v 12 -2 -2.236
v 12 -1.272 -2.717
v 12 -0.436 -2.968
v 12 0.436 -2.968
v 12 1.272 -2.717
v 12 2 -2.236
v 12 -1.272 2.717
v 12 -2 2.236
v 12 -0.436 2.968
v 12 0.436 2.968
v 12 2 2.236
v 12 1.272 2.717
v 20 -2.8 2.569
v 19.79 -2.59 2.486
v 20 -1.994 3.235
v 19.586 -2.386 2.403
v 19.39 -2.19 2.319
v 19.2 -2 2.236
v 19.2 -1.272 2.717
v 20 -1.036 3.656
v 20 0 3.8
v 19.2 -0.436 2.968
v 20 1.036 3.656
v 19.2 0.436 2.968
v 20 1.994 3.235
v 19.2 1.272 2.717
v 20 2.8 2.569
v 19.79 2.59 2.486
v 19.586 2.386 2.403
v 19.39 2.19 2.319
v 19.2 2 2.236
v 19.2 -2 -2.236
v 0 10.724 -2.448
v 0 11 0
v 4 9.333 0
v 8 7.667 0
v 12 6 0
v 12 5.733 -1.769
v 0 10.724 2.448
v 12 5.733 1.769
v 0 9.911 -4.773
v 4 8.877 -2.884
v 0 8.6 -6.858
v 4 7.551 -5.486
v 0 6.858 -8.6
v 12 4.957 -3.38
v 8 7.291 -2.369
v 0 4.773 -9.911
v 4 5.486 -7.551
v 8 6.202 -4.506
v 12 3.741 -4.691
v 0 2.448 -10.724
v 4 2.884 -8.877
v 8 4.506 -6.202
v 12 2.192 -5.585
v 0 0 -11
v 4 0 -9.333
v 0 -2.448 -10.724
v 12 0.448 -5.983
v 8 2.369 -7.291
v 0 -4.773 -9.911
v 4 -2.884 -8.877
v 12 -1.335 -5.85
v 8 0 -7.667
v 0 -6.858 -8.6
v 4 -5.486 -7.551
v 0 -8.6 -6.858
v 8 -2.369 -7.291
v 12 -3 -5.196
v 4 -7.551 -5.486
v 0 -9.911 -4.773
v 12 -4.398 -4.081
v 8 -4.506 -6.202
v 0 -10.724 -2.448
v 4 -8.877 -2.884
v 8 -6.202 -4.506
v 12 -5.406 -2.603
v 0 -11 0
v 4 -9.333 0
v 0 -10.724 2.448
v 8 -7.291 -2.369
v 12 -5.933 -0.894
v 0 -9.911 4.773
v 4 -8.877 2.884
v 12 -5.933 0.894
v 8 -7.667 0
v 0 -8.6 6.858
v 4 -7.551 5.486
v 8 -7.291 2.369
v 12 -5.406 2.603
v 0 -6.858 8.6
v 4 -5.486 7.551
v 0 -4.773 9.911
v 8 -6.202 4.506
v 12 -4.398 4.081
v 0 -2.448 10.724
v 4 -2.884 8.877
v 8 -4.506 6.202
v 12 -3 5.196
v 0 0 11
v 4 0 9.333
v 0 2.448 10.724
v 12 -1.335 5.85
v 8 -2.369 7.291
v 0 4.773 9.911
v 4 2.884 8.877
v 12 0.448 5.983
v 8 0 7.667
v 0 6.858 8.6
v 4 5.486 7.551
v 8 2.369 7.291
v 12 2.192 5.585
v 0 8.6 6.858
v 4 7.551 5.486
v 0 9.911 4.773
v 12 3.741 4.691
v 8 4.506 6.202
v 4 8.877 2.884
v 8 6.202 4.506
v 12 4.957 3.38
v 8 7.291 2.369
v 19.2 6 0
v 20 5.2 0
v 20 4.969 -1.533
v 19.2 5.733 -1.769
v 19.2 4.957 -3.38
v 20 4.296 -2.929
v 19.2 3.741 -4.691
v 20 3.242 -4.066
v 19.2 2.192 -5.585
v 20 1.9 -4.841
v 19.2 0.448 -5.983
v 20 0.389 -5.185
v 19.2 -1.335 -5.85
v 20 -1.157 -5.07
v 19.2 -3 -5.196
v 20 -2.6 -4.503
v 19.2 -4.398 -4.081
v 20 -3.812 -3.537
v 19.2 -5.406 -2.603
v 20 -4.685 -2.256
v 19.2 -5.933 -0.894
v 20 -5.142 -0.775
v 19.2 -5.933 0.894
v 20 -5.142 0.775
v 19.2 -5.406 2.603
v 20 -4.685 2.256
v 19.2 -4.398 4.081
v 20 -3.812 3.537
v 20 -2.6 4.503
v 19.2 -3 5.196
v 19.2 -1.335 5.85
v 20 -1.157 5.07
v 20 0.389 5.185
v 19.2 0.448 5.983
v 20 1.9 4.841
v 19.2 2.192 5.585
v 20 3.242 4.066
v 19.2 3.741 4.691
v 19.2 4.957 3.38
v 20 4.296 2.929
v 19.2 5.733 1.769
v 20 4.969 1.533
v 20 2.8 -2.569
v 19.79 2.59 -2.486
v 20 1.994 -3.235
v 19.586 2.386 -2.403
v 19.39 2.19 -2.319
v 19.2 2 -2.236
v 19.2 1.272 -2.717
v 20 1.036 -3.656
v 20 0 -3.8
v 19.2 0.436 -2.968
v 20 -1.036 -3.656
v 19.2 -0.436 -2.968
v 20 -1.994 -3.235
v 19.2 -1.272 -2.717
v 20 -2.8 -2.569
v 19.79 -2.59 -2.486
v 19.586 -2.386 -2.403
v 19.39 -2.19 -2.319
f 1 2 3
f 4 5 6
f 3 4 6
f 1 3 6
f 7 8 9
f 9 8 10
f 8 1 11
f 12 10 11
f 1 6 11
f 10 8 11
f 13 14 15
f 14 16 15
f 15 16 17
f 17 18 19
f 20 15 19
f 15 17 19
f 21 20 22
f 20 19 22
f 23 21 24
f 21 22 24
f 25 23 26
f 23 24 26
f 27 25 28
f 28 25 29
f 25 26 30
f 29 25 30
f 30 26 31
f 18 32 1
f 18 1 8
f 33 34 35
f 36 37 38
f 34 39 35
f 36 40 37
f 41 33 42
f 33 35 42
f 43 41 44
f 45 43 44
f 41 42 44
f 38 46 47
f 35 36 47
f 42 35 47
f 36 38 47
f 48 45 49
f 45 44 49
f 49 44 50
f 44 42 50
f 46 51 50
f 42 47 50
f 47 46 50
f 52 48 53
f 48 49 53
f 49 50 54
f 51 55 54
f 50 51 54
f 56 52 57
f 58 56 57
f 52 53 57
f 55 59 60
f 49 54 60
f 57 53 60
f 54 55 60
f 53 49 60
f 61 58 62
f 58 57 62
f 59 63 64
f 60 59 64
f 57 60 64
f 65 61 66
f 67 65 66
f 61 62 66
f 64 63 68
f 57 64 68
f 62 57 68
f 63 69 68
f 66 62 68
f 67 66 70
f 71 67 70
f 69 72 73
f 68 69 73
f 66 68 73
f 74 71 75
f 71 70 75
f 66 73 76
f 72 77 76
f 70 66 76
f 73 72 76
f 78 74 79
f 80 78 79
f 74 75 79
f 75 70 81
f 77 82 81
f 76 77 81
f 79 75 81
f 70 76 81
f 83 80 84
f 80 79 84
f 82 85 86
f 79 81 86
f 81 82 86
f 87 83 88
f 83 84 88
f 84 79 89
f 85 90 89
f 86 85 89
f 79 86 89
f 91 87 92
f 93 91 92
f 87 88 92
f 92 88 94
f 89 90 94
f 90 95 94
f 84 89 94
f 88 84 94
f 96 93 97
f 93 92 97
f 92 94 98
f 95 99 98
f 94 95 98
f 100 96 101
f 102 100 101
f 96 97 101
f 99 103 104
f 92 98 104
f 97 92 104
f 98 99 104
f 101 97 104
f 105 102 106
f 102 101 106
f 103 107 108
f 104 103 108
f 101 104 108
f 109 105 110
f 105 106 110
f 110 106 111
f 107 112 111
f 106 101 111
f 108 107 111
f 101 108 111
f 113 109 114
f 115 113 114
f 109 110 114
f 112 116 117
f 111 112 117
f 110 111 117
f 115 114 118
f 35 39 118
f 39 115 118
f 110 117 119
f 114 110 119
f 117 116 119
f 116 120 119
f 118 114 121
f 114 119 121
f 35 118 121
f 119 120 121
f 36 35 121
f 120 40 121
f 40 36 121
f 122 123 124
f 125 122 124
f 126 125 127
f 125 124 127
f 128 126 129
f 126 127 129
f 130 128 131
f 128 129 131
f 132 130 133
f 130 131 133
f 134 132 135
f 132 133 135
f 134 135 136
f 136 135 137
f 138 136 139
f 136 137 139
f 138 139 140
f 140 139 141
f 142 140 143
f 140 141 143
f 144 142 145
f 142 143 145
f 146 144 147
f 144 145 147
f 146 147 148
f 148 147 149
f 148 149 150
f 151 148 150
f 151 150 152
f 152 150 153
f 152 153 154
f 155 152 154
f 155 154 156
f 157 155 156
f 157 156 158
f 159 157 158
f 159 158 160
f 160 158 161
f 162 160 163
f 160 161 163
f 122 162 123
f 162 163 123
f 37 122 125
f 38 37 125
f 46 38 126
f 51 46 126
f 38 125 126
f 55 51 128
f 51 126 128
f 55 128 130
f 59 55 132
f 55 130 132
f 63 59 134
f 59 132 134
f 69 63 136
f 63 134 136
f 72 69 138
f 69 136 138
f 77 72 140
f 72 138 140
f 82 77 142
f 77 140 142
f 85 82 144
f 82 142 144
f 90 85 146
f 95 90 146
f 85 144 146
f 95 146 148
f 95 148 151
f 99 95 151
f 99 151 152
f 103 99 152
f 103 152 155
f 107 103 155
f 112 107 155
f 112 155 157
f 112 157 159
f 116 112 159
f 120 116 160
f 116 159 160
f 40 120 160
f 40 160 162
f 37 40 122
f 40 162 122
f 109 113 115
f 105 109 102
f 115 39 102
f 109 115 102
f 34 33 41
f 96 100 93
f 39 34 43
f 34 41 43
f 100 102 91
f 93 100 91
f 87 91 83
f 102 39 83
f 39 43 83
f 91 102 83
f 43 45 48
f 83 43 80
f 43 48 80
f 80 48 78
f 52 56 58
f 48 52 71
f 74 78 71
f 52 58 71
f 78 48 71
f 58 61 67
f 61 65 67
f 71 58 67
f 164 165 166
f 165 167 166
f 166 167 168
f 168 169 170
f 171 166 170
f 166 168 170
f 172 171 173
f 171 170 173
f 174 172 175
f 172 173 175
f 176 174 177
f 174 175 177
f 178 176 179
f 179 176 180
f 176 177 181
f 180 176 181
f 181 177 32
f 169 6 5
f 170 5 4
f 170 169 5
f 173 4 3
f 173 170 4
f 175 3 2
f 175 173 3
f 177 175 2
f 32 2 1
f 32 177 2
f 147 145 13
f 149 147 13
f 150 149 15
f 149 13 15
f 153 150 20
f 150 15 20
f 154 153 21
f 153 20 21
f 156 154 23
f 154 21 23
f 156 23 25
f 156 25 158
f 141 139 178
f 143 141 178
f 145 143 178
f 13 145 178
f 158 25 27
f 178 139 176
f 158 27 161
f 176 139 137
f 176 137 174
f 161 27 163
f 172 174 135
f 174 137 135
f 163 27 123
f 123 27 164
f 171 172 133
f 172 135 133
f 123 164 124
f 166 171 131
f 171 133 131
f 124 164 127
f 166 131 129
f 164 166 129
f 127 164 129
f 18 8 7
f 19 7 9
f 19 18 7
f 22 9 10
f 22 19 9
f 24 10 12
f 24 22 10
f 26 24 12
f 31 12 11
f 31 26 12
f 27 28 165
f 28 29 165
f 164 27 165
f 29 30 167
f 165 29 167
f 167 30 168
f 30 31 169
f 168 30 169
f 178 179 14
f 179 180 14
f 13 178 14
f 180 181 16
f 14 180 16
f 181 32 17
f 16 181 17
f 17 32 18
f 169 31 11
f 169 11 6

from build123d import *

# Parameters (mm, degrees)
CUT_EXTRUDE1_DEPTH = 8
CHAMFER1_SIZE      = 0.8


with BuildPart() as part:
    # Sketch2 → Revolve1 (revolve)
    with BuildSketch(Plane.XY):
        Polygon((0, 0), (0, 11), (12, 6), (20, 6), (20, 0), align=None)
    revolve(axis=Axis((20, 0, 0), (-1, 0, 0)))

    # Sketch3 → Cut-Extrude1 (cut)
    with BuildSketch(Plane(origin=(20, 0, 0), x_dir=(0, 0, -1), z_dir=(1, 0, 0))):
        with BuildLine():
            Line((-2.236067977, 2), (2.236067977, 2))
            ThreePointArc((2.236067977, 2), (3, 0), (2.236067977, -2))
            Line((2.236067977, -2), (-2.236067977, -2))
            ThreePointArc((-2.236067977, -2), (-3, 0), (-2.236067977, 2))
        make_face()
    extrude(amount=-CUT_EXTRUDE1_DEPTH, mode=Mode.SUBTRACT)

    # Chamfer1
    chamfer1_edges = [part.edges().sort_by_distance(p)[0] for p in [
        (20, 0, 3),
        (20, -2, 0),
        (20, 0, -3),
        (20, 2, 0),
        (20, -6, 0),
    ]]
    chamfer(chamfer1_edges, length=CHAMFER1_SIZE)


solid = part.part
